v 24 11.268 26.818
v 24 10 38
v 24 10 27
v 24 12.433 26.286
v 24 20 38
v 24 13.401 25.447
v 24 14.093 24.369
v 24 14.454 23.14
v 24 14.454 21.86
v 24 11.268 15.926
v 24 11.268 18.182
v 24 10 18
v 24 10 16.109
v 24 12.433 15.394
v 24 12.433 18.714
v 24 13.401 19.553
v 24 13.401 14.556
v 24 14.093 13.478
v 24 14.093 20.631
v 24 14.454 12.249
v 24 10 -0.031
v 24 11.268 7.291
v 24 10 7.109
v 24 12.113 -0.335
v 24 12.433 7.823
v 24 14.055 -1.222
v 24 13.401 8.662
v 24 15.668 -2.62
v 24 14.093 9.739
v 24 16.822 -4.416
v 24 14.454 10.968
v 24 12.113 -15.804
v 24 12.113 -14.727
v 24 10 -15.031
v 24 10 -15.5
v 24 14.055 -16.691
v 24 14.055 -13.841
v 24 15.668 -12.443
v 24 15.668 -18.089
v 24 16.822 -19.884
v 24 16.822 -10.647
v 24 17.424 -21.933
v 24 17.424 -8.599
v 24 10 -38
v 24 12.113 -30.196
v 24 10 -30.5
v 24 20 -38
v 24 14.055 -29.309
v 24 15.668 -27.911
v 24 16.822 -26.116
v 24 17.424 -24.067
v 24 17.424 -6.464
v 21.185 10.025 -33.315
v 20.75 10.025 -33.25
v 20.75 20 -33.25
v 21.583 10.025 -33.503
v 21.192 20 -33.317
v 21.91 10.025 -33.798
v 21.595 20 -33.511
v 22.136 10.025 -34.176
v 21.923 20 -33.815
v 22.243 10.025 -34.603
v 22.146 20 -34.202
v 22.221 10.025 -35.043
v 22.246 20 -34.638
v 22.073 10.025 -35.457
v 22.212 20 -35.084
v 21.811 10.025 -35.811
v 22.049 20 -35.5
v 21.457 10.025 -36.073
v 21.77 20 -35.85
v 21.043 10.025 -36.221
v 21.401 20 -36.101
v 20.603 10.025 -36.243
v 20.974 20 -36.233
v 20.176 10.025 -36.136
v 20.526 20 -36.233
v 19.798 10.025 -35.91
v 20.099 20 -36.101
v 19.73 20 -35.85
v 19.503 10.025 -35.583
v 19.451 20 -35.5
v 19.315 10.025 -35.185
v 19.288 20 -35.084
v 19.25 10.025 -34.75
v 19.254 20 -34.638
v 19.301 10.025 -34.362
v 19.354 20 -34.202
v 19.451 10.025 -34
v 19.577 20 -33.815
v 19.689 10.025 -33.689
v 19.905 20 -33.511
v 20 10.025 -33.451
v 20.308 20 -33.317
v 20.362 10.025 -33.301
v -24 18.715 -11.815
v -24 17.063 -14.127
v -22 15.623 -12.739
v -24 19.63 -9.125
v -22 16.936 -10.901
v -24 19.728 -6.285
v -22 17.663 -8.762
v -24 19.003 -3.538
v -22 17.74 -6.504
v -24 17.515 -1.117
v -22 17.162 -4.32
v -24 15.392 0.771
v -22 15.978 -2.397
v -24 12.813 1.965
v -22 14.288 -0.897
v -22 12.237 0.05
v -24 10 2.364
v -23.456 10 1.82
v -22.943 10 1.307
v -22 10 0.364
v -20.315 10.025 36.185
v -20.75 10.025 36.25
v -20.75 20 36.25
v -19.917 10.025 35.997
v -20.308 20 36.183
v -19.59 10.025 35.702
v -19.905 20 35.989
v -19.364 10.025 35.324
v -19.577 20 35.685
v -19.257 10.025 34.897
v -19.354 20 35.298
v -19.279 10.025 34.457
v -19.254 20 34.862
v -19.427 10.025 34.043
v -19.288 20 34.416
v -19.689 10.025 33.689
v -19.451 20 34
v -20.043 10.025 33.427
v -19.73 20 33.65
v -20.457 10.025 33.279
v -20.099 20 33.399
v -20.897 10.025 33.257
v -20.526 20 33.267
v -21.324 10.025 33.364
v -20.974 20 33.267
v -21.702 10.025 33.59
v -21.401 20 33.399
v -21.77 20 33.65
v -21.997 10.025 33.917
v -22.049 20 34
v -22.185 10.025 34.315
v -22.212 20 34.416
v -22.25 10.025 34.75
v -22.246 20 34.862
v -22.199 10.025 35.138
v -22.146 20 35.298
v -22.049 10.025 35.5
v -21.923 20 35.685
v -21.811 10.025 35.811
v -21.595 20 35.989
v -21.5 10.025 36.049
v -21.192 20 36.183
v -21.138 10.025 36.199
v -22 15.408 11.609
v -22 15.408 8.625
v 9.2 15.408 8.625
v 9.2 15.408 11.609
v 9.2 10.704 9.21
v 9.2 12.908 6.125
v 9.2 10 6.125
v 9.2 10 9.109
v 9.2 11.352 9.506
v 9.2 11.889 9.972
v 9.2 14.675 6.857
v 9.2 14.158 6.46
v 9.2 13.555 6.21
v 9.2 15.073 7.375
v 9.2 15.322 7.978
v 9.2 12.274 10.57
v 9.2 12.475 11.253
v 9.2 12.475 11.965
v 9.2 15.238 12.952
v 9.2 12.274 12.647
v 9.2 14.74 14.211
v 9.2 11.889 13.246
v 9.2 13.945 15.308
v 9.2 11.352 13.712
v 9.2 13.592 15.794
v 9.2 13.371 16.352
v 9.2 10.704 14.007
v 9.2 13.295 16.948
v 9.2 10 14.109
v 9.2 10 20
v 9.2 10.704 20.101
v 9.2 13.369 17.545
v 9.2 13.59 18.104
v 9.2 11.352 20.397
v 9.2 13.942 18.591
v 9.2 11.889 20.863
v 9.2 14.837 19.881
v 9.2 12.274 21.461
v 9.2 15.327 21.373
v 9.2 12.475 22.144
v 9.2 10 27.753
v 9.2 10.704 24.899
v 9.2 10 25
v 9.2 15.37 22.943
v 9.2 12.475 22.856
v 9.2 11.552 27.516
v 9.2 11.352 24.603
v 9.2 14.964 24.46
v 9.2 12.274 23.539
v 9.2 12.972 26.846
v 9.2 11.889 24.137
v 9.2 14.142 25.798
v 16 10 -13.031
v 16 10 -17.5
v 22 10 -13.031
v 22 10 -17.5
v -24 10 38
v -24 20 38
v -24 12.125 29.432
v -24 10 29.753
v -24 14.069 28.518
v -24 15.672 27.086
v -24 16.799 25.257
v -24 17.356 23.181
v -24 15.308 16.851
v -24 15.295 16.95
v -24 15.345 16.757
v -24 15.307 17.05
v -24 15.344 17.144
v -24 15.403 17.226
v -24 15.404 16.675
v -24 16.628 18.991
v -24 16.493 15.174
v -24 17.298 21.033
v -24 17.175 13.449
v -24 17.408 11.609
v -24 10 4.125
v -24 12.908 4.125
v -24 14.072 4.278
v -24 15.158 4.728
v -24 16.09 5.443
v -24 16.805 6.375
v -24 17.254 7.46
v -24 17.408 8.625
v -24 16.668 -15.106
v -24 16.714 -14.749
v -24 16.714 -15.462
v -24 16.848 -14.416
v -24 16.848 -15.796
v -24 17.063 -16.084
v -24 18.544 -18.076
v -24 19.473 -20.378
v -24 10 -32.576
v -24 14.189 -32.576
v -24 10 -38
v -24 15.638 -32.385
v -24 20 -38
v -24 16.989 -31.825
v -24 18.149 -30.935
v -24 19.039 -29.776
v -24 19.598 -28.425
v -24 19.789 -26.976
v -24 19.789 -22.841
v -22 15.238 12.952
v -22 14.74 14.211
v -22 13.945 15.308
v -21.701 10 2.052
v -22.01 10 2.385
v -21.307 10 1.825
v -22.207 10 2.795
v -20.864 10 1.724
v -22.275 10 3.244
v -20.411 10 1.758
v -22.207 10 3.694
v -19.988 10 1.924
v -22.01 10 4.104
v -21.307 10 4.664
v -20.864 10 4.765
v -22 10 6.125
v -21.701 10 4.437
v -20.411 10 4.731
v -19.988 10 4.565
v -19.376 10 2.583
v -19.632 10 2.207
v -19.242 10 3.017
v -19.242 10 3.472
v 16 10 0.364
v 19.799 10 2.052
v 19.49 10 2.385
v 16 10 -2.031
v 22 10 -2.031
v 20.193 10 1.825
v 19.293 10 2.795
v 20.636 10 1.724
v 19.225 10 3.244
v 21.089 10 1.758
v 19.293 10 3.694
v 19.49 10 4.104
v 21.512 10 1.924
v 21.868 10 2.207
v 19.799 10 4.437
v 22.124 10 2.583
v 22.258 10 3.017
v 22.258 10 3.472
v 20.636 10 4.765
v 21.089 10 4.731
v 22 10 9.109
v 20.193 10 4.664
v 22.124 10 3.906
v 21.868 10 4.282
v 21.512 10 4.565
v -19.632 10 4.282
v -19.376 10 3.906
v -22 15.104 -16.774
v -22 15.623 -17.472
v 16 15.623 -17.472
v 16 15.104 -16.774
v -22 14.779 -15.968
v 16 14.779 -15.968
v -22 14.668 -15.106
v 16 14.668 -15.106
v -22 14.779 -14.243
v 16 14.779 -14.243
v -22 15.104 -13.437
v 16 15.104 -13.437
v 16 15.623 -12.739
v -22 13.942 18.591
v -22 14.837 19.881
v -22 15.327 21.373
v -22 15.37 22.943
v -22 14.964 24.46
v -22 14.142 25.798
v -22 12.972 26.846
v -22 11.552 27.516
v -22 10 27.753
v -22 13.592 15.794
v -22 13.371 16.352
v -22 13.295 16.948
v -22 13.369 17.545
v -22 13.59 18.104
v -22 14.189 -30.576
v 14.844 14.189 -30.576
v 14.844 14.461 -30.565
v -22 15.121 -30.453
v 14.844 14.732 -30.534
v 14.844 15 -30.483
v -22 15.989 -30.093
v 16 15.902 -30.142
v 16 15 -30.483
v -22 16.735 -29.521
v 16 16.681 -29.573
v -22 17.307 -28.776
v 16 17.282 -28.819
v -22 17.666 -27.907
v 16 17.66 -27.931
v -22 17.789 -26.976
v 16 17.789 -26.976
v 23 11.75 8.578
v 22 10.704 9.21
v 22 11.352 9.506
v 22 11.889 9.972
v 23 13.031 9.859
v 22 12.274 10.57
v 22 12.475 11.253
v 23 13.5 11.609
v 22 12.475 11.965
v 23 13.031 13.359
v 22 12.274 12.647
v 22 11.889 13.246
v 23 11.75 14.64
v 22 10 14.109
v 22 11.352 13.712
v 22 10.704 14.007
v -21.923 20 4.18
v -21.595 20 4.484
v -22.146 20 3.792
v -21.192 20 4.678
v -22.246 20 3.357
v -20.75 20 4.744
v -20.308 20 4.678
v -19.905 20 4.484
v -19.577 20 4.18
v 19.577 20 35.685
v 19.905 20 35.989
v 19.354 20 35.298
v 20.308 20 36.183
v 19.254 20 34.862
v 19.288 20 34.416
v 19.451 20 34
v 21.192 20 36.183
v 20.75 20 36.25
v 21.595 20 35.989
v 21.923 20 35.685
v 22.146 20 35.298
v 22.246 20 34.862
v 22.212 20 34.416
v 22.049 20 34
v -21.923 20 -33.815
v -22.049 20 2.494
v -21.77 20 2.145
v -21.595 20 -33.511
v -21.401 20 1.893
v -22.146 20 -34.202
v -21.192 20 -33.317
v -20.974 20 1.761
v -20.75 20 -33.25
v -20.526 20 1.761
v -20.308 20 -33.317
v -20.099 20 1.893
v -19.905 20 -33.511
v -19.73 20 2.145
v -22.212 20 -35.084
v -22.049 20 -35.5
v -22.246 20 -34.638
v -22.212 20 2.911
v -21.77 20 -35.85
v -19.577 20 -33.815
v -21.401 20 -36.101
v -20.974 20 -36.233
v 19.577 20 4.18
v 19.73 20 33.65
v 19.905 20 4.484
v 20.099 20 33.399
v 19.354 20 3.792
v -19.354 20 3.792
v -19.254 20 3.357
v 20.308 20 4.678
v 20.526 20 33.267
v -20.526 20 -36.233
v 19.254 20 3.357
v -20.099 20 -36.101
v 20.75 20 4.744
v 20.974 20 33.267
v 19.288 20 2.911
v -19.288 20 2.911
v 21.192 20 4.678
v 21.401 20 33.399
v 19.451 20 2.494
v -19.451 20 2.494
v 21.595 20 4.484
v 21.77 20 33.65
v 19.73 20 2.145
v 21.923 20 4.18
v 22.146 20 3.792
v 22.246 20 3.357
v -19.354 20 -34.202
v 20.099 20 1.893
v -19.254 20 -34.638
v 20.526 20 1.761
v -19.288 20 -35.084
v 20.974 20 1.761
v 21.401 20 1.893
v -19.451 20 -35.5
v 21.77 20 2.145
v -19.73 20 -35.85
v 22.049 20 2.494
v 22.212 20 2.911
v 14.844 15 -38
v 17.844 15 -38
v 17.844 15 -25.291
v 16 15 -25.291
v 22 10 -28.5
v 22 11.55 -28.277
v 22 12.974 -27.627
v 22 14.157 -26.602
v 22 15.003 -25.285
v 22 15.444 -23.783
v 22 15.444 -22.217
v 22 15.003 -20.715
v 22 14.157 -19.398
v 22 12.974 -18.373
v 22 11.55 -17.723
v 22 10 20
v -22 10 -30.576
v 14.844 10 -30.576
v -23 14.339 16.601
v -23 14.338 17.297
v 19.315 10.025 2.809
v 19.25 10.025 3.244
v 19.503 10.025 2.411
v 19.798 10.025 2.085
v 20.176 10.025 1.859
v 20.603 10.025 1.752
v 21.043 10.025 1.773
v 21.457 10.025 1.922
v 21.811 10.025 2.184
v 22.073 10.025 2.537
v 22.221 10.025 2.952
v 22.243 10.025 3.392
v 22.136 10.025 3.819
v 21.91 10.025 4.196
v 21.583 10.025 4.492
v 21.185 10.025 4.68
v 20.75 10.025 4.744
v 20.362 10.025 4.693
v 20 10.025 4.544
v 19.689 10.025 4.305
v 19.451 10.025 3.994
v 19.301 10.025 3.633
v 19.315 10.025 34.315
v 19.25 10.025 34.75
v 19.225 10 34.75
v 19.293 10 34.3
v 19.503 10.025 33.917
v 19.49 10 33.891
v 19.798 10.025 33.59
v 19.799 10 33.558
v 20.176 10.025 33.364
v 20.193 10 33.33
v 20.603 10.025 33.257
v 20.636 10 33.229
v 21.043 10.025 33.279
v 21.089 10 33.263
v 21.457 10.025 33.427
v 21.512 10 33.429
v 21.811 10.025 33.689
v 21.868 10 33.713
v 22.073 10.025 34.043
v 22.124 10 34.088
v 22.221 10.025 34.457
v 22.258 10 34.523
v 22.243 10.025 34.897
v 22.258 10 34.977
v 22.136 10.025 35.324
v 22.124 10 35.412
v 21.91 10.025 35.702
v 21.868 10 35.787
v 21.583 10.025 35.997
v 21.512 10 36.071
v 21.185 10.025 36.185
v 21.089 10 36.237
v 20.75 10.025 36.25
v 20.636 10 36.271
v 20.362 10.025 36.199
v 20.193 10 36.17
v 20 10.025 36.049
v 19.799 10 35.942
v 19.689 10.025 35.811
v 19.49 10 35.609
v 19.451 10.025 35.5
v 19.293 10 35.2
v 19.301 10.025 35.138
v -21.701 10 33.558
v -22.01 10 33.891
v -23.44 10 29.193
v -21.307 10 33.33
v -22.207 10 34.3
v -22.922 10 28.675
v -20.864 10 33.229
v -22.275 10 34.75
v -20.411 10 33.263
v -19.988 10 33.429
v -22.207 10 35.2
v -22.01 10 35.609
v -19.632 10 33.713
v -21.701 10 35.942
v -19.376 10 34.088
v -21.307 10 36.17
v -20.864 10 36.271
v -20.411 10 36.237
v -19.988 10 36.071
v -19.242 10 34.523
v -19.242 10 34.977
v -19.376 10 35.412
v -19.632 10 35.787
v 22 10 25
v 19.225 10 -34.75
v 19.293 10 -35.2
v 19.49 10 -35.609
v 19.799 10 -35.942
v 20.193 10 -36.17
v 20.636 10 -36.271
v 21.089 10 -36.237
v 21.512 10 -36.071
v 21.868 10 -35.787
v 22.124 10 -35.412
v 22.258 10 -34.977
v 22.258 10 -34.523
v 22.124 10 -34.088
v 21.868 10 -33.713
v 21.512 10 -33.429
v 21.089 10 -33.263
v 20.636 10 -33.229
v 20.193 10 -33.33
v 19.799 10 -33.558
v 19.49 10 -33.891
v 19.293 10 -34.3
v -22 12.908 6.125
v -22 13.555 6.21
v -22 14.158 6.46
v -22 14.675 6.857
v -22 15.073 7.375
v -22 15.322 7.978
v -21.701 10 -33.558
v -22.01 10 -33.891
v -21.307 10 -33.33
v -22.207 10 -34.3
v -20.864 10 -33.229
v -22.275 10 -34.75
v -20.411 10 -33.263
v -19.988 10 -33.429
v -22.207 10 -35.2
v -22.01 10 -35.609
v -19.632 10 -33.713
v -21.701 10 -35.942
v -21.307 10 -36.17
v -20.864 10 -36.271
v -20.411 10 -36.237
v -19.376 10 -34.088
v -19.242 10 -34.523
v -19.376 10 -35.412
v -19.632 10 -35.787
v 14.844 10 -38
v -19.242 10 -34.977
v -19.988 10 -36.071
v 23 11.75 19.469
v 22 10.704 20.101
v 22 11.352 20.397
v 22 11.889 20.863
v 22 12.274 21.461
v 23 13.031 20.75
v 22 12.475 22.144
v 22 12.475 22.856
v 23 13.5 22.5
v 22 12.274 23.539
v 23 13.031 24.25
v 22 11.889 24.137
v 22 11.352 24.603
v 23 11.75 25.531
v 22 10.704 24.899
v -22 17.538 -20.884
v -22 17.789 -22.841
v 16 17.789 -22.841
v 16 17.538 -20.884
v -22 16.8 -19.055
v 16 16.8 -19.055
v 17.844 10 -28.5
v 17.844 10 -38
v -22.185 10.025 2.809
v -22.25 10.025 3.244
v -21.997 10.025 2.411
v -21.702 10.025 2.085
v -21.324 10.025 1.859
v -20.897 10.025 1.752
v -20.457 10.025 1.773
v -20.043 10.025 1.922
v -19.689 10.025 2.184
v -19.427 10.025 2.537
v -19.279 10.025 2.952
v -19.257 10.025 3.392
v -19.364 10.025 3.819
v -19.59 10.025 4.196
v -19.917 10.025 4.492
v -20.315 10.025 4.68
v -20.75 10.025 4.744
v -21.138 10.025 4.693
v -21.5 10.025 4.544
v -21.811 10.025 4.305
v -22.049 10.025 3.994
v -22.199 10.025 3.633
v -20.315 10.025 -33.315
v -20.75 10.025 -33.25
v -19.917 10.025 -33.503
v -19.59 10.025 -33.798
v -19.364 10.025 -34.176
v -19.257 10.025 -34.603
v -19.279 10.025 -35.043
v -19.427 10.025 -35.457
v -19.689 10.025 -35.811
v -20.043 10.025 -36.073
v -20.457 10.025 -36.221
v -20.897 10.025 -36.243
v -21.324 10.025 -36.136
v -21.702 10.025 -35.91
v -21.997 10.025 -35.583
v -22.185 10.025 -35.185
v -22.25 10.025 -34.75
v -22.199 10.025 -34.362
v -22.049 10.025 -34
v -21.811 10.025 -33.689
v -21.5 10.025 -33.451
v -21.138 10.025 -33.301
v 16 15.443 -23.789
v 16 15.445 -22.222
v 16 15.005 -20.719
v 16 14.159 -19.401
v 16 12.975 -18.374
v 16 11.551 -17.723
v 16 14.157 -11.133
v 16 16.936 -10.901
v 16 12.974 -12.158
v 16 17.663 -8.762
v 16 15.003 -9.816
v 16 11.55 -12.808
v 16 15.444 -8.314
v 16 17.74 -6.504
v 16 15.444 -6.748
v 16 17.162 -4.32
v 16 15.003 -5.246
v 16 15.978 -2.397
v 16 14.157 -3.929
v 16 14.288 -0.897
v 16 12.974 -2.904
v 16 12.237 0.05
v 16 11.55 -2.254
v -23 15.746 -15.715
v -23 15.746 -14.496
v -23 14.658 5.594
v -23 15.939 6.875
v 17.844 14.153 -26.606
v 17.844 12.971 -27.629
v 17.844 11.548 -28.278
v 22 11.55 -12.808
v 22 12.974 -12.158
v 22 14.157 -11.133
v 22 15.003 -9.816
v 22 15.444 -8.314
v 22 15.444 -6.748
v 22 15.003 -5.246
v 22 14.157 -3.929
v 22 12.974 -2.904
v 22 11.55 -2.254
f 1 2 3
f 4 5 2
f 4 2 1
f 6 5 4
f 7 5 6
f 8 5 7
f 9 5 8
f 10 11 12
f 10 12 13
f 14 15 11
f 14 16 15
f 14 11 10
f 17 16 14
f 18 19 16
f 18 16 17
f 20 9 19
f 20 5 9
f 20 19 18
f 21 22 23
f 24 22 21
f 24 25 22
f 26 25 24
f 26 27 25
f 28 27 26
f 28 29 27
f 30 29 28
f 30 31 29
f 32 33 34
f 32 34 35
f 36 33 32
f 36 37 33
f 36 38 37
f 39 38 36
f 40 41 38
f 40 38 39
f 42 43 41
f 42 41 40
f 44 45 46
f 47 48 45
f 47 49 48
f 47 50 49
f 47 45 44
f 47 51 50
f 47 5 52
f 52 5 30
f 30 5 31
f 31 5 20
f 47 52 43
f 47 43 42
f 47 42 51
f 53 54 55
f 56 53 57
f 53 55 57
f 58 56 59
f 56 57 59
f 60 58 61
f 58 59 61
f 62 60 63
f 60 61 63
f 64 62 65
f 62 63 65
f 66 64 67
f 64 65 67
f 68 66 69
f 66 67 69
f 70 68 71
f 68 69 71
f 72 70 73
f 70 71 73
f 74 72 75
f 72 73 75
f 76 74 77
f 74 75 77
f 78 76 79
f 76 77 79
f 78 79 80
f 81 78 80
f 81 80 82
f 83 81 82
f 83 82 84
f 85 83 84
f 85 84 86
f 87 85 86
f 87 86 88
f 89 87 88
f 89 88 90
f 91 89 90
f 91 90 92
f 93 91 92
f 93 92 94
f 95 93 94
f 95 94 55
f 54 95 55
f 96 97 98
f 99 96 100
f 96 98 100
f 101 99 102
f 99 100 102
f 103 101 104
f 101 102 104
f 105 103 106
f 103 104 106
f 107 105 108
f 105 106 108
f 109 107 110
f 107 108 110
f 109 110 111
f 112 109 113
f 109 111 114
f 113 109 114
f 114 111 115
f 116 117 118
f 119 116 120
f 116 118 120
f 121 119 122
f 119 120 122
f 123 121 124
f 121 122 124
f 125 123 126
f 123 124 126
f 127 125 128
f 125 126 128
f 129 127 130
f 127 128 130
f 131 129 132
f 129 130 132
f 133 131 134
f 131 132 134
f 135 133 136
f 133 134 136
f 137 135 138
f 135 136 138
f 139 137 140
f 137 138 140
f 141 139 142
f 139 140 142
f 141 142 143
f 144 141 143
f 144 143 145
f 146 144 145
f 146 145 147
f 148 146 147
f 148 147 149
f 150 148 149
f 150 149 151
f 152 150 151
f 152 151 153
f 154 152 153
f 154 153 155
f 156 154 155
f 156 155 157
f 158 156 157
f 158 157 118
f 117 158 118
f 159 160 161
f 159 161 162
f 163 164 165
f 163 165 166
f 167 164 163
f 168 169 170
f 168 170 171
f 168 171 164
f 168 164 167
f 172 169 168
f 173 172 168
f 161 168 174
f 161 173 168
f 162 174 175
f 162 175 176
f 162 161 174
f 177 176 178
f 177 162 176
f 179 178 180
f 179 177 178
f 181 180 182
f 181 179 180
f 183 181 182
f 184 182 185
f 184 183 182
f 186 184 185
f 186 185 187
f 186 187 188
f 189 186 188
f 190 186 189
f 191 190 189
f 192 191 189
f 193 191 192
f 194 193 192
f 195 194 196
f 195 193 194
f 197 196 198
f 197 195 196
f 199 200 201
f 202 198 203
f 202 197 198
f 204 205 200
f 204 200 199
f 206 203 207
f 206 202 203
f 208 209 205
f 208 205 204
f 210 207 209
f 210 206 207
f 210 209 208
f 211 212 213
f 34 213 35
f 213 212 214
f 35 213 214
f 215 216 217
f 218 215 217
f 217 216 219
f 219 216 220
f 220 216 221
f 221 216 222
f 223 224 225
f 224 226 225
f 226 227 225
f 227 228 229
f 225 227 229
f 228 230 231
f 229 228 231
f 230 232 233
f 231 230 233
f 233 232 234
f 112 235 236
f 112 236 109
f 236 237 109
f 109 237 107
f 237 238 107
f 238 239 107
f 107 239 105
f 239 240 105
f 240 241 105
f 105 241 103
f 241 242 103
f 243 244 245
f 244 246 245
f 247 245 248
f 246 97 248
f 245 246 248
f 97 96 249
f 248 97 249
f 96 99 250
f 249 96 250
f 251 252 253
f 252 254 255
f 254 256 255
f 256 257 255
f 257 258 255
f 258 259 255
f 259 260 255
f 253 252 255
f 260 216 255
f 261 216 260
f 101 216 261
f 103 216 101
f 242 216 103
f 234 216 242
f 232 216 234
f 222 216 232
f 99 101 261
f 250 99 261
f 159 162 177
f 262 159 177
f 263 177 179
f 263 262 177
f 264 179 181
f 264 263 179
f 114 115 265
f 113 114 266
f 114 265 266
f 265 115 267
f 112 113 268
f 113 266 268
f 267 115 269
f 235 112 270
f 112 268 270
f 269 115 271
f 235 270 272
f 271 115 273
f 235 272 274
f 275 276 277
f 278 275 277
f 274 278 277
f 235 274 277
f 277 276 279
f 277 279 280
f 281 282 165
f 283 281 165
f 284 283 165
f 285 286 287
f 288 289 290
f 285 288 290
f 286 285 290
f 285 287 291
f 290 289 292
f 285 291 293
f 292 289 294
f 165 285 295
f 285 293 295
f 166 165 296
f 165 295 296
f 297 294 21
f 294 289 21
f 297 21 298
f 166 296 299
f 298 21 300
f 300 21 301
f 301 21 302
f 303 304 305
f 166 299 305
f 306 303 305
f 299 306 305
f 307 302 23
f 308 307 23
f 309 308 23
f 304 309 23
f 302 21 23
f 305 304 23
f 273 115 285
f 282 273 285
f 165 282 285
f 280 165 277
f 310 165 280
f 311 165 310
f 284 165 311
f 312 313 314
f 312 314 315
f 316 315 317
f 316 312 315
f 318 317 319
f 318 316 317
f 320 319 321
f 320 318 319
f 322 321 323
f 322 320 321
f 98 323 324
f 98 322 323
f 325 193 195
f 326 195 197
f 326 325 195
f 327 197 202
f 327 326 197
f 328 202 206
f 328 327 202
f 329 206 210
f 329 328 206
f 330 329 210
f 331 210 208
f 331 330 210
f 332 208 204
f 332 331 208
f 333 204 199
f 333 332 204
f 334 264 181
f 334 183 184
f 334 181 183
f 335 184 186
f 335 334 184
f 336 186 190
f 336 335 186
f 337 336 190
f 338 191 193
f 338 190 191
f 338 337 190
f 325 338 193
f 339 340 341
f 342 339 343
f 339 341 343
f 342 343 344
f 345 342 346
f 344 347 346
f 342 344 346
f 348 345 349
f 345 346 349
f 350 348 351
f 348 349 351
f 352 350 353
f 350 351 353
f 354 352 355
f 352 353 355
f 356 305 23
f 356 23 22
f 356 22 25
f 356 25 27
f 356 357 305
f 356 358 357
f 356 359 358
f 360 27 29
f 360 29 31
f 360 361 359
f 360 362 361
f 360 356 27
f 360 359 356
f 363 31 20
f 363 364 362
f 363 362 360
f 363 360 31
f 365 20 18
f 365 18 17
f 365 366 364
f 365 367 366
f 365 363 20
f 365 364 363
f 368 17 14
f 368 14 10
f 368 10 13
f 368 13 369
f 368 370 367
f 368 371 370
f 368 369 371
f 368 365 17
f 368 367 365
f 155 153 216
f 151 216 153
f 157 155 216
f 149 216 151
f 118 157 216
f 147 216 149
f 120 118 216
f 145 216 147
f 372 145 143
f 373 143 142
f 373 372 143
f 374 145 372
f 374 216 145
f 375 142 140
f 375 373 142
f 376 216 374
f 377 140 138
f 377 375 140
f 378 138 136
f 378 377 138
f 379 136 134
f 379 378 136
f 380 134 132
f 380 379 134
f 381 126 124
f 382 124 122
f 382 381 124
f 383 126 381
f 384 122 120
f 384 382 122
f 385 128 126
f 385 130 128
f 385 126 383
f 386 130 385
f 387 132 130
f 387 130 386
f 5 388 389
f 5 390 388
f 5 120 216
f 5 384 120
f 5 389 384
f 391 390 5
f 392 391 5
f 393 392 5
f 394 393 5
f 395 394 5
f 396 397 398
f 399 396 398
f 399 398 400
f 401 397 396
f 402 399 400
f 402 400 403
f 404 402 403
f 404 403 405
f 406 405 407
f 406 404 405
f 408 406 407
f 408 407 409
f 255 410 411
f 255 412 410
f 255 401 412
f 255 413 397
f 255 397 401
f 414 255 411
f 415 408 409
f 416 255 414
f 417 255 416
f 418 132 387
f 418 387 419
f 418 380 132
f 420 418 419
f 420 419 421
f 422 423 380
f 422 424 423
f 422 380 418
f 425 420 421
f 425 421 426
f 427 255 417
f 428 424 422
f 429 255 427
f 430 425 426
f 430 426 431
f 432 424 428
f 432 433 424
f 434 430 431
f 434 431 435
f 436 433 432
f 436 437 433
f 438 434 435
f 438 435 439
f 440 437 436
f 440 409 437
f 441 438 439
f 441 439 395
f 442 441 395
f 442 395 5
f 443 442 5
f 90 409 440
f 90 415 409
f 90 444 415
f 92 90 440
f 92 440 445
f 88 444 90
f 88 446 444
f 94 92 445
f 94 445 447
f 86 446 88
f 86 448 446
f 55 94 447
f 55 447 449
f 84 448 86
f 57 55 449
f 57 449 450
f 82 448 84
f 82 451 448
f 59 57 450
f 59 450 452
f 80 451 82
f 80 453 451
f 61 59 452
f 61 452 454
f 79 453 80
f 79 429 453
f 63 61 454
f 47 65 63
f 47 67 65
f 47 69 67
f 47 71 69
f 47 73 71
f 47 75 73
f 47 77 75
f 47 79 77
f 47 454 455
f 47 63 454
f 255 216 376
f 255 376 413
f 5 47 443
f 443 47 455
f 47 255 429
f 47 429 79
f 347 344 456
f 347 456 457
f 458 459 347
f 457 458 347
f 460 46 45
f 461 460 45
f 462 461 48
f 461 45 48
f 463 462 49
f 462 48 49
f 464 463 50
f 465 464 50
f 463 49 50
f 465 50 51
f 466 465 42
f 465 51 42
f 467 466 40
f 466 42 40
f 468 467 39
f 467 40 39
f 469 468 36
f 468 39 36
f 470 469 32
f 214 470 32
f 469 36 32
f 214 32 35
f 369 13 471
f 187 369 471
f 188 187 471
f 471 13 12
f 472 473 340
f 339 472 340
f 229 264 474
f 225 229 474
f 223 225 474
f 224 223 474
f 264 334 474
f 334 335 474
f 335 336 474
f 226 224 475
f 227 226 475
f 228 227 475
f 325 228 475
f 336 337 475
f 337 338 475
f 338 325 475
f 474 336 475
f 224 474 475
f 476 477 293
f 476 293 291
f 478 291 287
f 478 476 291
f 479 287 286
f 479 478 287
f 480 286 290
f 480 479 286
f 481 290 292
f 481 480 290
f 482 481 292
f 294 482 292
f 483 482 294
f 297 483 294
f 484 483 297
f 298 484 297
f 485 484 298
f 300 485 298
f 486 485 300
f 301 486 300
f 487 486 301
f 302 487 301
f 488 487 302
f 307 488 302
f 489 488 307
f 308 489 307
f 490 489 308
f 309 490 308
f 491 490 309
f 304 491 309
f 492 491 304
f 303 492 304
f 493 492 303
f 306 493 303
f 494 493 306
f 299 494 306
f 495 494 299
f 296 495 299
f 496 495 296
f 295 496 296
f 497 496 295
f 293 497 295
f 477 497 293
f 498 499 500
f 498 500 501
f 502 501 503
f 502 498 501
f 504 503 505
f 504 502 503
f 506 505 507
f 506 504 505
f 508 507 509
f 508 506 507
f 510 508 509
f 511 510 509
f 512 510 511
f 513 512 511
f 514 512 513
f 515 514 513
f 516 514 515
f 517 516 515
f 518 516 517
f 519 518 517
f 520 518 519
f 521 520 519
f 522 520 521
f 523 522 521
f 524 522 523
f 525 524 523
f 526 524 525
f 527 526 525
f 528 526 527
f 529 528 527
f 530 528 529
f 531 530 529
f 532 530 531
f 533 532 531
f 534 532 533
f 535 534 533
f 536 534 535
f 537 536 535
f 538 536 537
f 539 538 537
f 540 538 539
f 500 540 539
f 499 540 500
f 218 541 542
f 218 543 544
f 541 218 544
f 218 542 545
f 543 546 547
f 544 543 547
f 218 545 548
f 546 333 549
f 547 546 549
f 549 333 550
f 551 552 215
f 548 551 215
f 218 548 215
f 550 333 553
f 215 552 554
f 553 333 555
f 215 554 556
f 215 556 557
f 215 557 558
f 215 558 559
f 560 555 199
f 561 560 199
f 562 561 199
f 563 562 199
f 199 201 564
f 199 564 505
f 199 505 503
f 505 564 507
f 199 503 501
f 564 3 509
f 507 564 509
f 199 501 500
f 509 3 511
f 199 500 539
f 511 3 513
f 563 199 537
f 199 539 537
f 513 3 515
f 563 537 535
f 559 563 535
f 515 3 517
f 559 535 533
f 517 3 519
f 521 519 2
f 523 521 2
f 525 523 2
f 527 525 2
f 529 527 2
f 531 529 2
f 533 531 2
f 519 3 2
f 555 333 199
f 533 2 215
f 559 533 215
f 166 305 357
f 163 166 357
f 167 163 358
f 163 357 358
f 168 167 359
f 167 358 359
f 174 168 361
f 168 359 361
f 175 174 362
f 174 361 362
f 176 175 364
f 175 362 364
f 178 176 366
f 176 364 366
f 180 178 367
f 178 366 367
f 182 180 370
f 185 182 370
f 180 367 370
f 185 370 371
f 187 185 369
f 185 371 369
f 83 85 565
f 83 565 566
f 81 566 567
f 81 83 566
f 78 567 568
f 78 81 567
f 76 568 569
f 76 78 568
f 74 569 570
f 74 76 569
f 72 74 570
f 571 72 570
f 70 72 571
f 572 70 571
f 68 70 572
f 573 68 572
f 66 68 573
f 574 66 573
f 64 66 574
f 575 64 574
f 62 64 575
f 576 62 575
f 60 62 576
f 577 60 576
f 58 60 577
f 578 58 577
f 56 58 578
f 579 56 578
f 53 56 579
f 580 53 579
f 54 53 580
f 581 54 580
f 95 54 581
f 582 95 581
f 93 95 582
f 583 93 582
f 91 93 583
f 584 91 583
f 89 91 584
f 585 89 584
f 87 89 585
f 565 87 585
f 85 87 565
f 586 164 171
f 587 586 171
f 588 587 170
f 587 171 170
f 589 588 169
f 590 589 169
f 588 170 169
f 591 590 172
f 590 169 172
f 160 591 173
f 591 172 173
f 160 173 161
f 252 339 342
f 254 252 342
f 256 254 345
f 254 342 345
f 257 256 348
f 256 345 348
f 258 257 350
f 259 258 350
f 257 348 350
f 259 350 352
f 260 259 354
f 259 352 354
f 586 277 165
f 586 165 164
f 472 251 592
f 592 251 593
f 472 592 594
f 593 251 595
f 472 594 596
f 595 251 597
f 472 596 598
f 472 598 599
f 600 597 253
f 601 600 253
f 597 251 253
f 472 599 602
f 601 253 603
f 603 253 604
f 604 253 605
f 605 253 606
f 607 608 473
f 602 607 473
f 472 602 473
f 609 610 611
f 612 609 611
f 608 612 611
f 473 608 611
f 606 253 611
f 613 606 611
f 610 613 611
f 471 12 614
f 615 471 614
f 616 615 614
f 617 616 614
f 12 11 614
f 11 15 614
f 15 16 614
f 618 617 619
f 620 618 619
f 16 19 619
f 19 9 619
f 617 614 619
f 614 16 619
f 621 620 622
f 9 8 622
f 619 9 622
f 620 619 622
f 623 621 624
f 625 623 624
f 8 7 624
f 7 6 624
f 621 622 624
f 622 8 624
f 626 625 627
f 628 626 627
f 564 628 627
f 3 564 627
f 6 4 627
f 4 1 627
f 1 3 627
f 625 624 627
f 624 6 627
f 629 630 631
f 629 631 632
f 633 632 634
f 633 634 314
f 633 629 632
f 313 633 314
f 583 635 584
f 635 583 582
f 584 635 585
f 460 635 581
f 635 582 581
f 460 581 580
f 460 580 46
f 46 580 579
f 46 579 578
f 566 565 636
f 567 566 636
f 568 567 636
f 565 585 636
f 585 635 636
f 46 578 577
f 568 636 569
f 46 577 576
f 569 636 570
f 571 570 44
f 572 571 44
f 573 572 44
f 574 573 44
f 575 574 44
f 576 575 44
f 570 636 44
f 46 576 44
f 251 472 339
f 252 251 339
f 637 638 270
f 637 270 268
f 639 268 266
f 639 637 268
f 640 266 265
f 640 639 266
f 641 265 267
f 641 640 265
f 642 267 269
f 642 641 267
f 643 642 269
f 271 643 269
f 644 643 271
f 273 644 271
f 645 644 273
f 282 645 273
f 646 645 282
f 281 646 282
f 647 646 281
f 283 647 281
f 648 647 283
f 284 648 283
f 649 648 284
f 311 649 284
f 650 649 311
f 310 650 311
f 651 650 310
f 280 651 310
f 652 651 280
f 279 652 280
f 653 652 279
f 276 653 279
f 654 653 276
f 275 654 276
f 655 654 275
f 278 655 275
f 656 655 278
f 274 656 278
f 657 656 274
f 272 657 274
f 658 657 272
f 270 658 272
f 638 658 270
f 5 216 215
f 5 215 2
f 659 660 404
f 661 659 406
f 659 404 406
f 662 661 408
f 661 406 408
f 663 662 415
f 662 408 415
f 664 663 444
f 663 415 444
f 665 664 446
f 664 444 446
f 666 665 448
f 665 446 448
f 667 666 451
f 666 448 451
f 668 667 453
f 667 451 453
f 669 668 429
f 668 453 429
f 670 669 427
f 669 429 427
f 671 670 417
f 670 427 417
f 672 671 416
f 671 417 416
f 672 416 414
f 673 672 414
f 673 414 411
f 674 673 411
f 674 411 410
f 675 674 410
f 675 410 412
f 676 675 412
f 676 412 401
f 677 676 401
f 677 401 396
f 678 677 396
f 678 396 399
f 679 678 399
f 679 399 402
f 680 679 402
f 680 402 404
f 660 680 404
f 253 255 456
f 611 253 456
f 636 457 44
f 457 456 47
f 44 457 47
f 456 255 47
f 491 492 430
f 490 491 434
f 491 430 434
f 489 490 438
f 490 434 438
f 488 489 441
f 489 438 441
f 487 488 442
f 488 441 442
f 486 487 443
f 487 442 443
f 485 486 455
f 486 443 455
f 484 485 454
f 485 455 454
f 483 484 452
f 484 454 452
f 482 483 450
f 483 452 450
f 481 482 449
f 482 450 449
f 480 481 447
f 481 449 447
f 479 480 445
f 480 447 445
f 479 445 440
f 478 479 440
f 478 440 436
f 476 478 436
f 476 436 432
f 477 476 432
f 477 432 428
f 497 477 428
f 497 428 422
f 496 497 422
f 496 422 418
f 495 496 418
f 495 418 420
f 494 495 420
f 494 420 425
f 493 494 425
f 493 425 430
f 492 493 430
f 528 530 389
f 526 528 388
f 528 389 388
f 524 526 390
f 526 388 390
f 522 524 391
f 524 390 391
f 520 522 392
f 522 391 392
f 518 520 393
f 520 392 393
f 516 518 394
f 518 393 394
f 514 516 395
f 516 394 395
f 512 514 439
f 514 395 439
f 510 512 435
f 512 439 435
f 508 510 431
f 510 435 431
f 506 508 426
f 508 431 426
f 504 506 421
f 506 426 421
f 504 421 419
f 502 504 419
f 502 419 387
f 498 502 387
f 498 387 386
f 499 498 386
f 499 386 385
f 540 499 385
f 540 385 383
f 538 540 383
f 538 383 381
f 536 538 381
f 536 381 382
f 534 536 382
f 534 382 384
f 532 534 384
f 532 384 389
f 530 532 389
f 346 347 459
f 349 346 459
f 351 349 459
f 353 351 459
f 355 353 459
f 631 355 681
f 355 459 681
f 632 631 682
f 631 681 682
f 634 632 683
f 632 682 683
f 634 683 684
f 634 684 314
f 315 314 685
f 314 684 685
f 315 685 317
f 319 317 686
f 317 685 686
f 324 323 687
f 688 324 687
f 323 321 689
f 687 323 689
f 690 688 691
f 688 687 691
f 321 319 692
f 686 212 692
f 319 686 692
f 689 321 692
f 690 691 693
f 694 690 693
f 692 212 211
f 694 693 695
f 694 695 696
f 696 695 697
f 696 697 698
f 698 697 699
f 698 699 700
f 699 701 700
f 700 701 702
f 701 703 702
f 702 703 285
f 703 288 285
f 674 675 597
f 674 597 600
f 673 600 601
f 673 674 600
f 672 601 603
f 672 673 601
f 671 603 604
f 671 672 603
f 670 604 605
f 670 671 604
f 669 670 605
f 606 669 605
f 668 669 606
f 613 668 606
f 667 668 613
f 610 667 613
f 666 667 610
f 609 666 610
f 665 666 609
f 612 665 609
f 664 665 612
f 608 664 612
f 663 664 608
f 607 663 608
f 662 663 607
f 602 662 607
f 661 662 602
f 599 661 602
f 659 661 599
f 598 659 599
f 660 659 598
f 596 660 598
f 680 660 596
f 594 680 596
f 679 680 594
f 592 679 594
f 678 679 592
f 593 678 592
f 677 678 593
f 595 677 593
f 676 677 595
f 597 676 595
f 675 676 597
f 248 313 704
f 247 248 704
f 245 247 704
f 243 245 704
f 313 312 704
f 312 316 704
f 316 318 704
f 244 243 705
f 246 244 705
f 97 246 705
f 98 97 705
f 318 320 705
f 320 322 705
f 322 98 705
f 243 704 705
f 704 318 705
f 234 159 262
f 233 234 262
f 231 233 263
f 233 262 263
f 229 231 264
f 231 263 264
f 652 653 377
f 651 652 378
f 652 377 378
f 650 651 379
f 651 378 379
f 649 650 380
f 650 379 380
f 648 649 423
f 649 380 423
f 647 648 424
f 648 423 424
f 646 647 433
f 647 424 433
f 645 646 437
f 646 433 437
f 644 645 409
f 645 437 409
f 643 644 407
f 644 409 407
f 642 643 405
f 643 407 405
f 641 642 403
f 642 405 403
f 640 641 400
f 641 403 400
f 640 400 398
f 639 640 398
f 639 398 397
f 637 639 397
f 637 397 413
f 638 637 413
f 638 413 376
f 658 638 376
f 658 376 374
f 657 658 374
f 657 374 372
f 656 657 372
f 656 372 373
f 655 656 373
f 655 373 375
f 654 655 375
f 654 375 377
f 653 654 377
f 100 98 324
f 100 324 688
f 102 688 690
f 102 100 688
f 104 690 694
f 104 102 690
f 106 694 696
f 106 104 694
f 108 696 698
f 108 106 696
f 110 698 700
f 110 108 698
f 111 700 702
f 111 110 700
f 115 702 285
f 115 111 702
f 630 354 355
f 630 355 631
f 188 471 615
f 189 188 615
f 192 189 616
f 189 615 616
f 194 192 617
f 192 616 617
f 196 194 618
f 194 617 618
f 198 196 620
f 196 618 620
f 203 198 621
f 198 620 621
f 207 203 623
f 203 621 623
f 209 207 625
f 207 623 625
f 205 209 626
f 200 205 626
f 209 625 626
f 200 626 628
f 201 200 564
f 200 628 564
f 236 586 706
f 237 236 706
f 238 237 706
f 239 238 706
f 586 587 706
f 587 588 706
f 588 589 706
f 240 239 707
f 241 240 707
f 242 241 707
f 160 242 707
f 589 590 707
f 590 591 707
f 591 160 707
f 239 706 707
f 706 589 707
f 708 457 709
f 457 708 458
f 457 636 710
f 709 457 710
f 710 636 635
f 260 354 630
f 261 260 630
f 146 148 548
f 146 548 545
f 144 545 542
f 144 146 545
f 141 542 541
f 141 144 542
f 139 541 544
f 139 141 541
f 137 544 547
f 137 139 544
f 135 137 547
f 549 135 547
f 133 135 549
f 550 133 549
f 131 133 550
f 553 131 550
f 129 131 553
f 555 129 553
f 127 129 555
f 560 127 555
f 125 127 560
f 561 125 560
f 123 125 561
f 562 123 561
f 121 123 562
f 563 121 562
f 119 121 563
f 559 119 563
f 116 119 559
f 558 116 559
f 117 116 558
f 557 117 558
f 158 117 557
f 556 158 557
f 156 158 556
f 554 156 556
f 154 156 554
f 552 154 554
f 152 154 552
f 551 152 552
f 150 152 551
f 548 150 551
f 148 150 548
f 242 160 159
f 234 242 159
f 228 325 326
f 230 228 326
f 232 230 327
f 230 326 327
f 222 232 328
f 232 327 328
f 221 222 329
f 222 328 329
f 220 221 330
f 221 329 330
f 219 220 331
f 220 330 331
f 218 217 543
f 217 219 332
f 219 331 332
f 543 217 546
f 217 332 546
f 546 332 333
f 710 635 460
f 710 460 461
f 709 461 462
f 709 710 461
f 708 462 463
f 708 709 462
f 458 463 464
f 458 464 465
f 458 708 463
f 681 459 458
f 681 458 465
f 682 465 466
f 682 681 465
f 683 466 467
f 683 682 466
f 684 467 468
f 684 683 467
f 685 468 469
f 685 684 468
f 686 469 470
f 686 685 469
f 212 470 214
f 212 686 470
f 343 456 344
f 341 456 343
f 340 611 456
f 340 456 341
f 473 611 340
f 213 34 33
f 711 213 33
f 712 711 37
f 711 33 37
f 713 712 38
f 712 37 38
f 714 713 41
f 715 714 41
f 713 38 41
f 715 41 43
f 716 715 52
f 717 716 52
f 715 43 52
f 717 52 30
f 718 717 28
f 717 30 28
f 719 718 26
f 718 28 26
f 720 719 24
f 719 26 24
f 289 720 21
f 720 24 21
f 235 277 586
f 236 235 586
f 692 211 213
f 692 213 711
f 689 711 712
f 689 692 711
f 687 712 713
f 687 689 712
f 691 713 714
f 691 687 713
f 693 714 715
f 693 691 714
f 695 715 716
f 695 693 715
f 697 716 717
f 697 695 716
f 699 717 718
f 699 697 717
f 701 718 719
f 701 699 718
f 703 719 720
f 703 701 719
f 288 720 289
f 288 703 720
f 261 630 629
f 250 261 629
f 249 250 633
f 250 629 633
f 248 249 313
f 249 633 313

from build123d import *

# Parameters (mm, degrees)
SKETCH1_W                   = 48
SKETCH1_H                   = 76
BOSS_EXTRUDE1_DEPTH         = 10
SKETCH2_R                   = 5.5
SKETCH2_R_2                 = 2.5
CUT_EXTRUDE1_DEPTH          = 63.032249677
CUT_EXTRUDE2_DEPTH          = 40
FILLET1_R                   = 3.6
FILLET2_R                   = 2.5
M3_TAPPED_HOLE1_D           = 2.5
M3_TAPPED_HOLE1_CSINK_D     = 3.05
M3_TAPPED_HOLE1_CSINK_ANGLE = 90
CHAMFER1_SIZE               = 2
SKETCH6_R                   = 1.5
CUT_EXTRUDE3_DEPTH          = 10
BOSS_EXTRUDE2_DEPTH         = 6.8
CHAMFER2_SIZE               = 2
SKETCH8_W                   = 3
SKETCH8_H                   = 33.594295814
CUT_EXTRUDE4_DEPTH          = 5


with BuildPart() as part:
    # Sketch1 → Boss-Extrude1 (new body)
    with BuildSketch(Plane(origin=(0, 0, 0), x_dir=(1, 0, 0), z_dir=(0, 1, 0))):
        Rectangle(SKETCH1_W, SKETCH1_H)
    extrude(amount=BOSS_EXTRUDE1_DEPTH)

    # Sketch2 → Cut-Extrude1 (cut, through all)
    with BuildSketch(Plane.ZY.offset(24)):
        with Locations((-23, 10)):
            Circle(SKETCH2_R)
        with Locations((-7.531152857, 10)):
            Circle(SKETCH2_R)
        with Locations((11.608764346, 10)):
            Circle(SKETCH2_R_2)
        with Locations((22.5, 10)):
            Circle(SKETCH2_R_2)
    extrude(amount=-CUT_EXTRUDE1_DEPTH, mode=Mode.SUBTRACT)

    # Sketch3 → Cut-Extrude2 (cut)
    with BuildSketch(Plane.ZY.offset(24)):
        with BuildLine():
            Line((-30.575601228, 16.807330276), (-30.575601228, 2.210930276))
            Line((-30.575601228, 2.210930276), (-22.840601228, 2.210930276))
            ThreePointArc((-22.840601228, 2.210930276), (-19.946134653, 2.772905234), (-17.472254435, 4.377171194))
            ThreePointArc((-17.472254435, 4.377171194), (-15.105601228, 5.332165574), (-12.73894802, 4.377171194))
            ThreePointArc((-12.73894802, 4.377171194), (0.284776113, 8.838942121), (-10.941513582, 16.807330276))
            Line((-10.941513582, 16.807330276), (-30.575601228, 16.807330276))
        make_face()
        with BuildLine():
            Line((6.124741926, 18.195630094), (6.124741926, 4.592448506))
            Line((6.124741926, 4.592448506), (11.608764346, 4.592448506))
            ThreePointArc((11.608764346, 4.592448506), (13.597512463, 4.971432203), (15.307501103, 6.055261787))
            ThreePointArc((15.307501103, 6.055261787), (16.948477041, 6.705162469), (18.590697922, 6.058414065))
            ThreePointArc((18.590697922, 6.058414065), (26.266760255, 6.298858065), (26.068998857, 13.976138617))
            Line((26.068998857, 13.976138617), (6.124741926, 18.195630094))
        make_face()
    extrude(amount=-CUT_EXTRUDE2_DEPTH, mode=Mode.SUBTRACT)

    # Fillet1
    fillet1_edges = [part.edges().sort_by_distance(p)[0] for p in [
        (-4, 2.210930276, -30.575601228),
    ]]
    fillet(fillet1_edges, radius=FILLET1_R)

    # Fillet2
    fillet2_edges = [part.edges().sort_by_distance(p)[0] for p in [
        (-4, 4.592448506, 6.124741926),
    ]]
    fillet(fillet2_edges, radius=FILLET2_R)

    # M3 Tapped Hole1 (through all)
    with Locations(Plane(origin=(0, 10, 0), x_dir=(1, 0, 0), z_dir=(0, 1, 0))):
        with Locations((-20.75, 34.75), (20.75, 34.75), (20.75, -3.244475858), (-20.75, -3.244475858), (-20.75, -34.75), (20.75, -34.75)):
            CounterSinkHole(M3_TAPPED_HOLE1_D / 2, M3_TAPPED_HOLE1_CSINK_D / 2, counter_sink_angle=M3_TAPPED_HOLE1_CSINK_ANGLE)

    # Chamfer1
    chamfer1_edges = [part.edges().sort_by_distance(p)[0] for p in [
        (-24, 2.210930276, -24.908101228),
        (-24, 3.265345864, -29.52118564),
        (-24, 4.592448506, 10.116753136),
        (-24, 5.324681553, 6.856974973),
        (-24, 7.905465138, -30.575601228),
        (-24, 2.772905234, -19.946134653),
        (-24, 5.332165574, -15.105601228),
        (-24, 2.837756402, -4.320340718),
        (-24, 8.546224253, 6.124741926),
        (-24, 4.971432203, 13.597512463),
        (-24, 6.705162469, 16.948477041),
        (-24, 5.035673535, 24.459770758),
    ]]
    chamfer(chamfer1_edges, length=CHAMFER1_SIZE)


with BuildPart() as body_2:
    # Mirror1: mirrored copy
    add(part.part.mirror(Plane(origin=(0, 10, 0), x_dir=(0, 0, 1), z_dir=(0, -1, 0))))

    # Sketch6 → Cut-Extrude3 (cut)
    with BuildSketch(Plane(origin=(0, 20, 0), x_dir=(1, 0, 0), z_dir=(0, 1, 0))):
        with Locations(Location((20.75, 34.75, 0), (0, 0, 270))):
            Circle(SKETCH6_R)
        with Locations(Location((-20.75, 34.75, 0), (0, 0, 270))):
            Circle(SKETCH6_R)
        with Locations(Location((-20.75, -3.244475858, 0), (0, 0, 270))):
            Circle(SKETCH6_R)
        with Locations(Location((20.75, -3.244475858, 0), (0, 0, 270))):
            Circle(SKETCH6_R)
        with Locations(Location((20.75, -34.75, 0), (0, 0, 270))):
            Circle(SKETCH6_R)
        with Locations(Location((-20.75, -34.75, 0), (0, 0, 270))):
            Circle(SKETCH6_R)
    extrude(amount=-CUT_EXTRUDE3_DEPTH, mode=Mode.SUBTRACT)

    # Sketch7 → Boss-Extrude2 (add)
    with BuildSketch(Plane.ZY.offset(-16)):
        with BuildLine():
            Line((6.124741926, 12.907551494), (6.124741926, 10))
            Line((6.124741926, 10), (9.108764346, 10))
            ThreePointArc((9.108764346, 10), (11.608764346, 12.5), (14.108764346, 10))
            Line((14.108764346, 10), (20, 10))
            ThreePointArc((20, 10), (22.5, 12.5), (25, 10))
            Line((25, 10), (27.753321561, 10))
            ThreePointArc((27.753321561, 10), (24.459770758, 14.964326465), (18.590697922, 13.941585935))
            ThreePointArc((18.590697922, 13.941585935), (16.948477041, 13.294837531), (15.307501103, 13.944738213))
            ThreePointArc((15.307501103, 13.944738213), (13.597512463, 15.028567797), (11.608764346, 15.407551494))
            Line((11.608764346, 15.407551494), (8.624741926, 15.407551494))
            ThreePointArc((8.624741926, 15.407551494), (6.856974973, 14.675318447), (6.124741926, 12.907551494))
        make_face()
    extrude(amount=BOSS_EXTRUDE2_DEPTH)

    # Chamfer2
    chamfer2_edges = [body_2.edges().sort_by_distance(p)[0] for p in [
        (24, 15.5, -23),
        (24, 15.5, -7.531152857),
        (24, 12.5, 11.608764346),
        (24, 12.5, 22.5),
    ]]
    chamfer(chamfer2_edges, length=CHAMFER2_SIZE)

    # Sketch8 → Cut-Extrude4 (cut)
    with BuildSketch(Plane.XZ.offset(-10)):
        with Locations((16.34371358, -39.350695858)):
            Rectangle(SKETCH8_W, SKETCH8_H)
    extrude(amount=-CUT_EXTRUDE4_DEPTH, mode=Mode.SUBTRACT)


solid = body_2.part
